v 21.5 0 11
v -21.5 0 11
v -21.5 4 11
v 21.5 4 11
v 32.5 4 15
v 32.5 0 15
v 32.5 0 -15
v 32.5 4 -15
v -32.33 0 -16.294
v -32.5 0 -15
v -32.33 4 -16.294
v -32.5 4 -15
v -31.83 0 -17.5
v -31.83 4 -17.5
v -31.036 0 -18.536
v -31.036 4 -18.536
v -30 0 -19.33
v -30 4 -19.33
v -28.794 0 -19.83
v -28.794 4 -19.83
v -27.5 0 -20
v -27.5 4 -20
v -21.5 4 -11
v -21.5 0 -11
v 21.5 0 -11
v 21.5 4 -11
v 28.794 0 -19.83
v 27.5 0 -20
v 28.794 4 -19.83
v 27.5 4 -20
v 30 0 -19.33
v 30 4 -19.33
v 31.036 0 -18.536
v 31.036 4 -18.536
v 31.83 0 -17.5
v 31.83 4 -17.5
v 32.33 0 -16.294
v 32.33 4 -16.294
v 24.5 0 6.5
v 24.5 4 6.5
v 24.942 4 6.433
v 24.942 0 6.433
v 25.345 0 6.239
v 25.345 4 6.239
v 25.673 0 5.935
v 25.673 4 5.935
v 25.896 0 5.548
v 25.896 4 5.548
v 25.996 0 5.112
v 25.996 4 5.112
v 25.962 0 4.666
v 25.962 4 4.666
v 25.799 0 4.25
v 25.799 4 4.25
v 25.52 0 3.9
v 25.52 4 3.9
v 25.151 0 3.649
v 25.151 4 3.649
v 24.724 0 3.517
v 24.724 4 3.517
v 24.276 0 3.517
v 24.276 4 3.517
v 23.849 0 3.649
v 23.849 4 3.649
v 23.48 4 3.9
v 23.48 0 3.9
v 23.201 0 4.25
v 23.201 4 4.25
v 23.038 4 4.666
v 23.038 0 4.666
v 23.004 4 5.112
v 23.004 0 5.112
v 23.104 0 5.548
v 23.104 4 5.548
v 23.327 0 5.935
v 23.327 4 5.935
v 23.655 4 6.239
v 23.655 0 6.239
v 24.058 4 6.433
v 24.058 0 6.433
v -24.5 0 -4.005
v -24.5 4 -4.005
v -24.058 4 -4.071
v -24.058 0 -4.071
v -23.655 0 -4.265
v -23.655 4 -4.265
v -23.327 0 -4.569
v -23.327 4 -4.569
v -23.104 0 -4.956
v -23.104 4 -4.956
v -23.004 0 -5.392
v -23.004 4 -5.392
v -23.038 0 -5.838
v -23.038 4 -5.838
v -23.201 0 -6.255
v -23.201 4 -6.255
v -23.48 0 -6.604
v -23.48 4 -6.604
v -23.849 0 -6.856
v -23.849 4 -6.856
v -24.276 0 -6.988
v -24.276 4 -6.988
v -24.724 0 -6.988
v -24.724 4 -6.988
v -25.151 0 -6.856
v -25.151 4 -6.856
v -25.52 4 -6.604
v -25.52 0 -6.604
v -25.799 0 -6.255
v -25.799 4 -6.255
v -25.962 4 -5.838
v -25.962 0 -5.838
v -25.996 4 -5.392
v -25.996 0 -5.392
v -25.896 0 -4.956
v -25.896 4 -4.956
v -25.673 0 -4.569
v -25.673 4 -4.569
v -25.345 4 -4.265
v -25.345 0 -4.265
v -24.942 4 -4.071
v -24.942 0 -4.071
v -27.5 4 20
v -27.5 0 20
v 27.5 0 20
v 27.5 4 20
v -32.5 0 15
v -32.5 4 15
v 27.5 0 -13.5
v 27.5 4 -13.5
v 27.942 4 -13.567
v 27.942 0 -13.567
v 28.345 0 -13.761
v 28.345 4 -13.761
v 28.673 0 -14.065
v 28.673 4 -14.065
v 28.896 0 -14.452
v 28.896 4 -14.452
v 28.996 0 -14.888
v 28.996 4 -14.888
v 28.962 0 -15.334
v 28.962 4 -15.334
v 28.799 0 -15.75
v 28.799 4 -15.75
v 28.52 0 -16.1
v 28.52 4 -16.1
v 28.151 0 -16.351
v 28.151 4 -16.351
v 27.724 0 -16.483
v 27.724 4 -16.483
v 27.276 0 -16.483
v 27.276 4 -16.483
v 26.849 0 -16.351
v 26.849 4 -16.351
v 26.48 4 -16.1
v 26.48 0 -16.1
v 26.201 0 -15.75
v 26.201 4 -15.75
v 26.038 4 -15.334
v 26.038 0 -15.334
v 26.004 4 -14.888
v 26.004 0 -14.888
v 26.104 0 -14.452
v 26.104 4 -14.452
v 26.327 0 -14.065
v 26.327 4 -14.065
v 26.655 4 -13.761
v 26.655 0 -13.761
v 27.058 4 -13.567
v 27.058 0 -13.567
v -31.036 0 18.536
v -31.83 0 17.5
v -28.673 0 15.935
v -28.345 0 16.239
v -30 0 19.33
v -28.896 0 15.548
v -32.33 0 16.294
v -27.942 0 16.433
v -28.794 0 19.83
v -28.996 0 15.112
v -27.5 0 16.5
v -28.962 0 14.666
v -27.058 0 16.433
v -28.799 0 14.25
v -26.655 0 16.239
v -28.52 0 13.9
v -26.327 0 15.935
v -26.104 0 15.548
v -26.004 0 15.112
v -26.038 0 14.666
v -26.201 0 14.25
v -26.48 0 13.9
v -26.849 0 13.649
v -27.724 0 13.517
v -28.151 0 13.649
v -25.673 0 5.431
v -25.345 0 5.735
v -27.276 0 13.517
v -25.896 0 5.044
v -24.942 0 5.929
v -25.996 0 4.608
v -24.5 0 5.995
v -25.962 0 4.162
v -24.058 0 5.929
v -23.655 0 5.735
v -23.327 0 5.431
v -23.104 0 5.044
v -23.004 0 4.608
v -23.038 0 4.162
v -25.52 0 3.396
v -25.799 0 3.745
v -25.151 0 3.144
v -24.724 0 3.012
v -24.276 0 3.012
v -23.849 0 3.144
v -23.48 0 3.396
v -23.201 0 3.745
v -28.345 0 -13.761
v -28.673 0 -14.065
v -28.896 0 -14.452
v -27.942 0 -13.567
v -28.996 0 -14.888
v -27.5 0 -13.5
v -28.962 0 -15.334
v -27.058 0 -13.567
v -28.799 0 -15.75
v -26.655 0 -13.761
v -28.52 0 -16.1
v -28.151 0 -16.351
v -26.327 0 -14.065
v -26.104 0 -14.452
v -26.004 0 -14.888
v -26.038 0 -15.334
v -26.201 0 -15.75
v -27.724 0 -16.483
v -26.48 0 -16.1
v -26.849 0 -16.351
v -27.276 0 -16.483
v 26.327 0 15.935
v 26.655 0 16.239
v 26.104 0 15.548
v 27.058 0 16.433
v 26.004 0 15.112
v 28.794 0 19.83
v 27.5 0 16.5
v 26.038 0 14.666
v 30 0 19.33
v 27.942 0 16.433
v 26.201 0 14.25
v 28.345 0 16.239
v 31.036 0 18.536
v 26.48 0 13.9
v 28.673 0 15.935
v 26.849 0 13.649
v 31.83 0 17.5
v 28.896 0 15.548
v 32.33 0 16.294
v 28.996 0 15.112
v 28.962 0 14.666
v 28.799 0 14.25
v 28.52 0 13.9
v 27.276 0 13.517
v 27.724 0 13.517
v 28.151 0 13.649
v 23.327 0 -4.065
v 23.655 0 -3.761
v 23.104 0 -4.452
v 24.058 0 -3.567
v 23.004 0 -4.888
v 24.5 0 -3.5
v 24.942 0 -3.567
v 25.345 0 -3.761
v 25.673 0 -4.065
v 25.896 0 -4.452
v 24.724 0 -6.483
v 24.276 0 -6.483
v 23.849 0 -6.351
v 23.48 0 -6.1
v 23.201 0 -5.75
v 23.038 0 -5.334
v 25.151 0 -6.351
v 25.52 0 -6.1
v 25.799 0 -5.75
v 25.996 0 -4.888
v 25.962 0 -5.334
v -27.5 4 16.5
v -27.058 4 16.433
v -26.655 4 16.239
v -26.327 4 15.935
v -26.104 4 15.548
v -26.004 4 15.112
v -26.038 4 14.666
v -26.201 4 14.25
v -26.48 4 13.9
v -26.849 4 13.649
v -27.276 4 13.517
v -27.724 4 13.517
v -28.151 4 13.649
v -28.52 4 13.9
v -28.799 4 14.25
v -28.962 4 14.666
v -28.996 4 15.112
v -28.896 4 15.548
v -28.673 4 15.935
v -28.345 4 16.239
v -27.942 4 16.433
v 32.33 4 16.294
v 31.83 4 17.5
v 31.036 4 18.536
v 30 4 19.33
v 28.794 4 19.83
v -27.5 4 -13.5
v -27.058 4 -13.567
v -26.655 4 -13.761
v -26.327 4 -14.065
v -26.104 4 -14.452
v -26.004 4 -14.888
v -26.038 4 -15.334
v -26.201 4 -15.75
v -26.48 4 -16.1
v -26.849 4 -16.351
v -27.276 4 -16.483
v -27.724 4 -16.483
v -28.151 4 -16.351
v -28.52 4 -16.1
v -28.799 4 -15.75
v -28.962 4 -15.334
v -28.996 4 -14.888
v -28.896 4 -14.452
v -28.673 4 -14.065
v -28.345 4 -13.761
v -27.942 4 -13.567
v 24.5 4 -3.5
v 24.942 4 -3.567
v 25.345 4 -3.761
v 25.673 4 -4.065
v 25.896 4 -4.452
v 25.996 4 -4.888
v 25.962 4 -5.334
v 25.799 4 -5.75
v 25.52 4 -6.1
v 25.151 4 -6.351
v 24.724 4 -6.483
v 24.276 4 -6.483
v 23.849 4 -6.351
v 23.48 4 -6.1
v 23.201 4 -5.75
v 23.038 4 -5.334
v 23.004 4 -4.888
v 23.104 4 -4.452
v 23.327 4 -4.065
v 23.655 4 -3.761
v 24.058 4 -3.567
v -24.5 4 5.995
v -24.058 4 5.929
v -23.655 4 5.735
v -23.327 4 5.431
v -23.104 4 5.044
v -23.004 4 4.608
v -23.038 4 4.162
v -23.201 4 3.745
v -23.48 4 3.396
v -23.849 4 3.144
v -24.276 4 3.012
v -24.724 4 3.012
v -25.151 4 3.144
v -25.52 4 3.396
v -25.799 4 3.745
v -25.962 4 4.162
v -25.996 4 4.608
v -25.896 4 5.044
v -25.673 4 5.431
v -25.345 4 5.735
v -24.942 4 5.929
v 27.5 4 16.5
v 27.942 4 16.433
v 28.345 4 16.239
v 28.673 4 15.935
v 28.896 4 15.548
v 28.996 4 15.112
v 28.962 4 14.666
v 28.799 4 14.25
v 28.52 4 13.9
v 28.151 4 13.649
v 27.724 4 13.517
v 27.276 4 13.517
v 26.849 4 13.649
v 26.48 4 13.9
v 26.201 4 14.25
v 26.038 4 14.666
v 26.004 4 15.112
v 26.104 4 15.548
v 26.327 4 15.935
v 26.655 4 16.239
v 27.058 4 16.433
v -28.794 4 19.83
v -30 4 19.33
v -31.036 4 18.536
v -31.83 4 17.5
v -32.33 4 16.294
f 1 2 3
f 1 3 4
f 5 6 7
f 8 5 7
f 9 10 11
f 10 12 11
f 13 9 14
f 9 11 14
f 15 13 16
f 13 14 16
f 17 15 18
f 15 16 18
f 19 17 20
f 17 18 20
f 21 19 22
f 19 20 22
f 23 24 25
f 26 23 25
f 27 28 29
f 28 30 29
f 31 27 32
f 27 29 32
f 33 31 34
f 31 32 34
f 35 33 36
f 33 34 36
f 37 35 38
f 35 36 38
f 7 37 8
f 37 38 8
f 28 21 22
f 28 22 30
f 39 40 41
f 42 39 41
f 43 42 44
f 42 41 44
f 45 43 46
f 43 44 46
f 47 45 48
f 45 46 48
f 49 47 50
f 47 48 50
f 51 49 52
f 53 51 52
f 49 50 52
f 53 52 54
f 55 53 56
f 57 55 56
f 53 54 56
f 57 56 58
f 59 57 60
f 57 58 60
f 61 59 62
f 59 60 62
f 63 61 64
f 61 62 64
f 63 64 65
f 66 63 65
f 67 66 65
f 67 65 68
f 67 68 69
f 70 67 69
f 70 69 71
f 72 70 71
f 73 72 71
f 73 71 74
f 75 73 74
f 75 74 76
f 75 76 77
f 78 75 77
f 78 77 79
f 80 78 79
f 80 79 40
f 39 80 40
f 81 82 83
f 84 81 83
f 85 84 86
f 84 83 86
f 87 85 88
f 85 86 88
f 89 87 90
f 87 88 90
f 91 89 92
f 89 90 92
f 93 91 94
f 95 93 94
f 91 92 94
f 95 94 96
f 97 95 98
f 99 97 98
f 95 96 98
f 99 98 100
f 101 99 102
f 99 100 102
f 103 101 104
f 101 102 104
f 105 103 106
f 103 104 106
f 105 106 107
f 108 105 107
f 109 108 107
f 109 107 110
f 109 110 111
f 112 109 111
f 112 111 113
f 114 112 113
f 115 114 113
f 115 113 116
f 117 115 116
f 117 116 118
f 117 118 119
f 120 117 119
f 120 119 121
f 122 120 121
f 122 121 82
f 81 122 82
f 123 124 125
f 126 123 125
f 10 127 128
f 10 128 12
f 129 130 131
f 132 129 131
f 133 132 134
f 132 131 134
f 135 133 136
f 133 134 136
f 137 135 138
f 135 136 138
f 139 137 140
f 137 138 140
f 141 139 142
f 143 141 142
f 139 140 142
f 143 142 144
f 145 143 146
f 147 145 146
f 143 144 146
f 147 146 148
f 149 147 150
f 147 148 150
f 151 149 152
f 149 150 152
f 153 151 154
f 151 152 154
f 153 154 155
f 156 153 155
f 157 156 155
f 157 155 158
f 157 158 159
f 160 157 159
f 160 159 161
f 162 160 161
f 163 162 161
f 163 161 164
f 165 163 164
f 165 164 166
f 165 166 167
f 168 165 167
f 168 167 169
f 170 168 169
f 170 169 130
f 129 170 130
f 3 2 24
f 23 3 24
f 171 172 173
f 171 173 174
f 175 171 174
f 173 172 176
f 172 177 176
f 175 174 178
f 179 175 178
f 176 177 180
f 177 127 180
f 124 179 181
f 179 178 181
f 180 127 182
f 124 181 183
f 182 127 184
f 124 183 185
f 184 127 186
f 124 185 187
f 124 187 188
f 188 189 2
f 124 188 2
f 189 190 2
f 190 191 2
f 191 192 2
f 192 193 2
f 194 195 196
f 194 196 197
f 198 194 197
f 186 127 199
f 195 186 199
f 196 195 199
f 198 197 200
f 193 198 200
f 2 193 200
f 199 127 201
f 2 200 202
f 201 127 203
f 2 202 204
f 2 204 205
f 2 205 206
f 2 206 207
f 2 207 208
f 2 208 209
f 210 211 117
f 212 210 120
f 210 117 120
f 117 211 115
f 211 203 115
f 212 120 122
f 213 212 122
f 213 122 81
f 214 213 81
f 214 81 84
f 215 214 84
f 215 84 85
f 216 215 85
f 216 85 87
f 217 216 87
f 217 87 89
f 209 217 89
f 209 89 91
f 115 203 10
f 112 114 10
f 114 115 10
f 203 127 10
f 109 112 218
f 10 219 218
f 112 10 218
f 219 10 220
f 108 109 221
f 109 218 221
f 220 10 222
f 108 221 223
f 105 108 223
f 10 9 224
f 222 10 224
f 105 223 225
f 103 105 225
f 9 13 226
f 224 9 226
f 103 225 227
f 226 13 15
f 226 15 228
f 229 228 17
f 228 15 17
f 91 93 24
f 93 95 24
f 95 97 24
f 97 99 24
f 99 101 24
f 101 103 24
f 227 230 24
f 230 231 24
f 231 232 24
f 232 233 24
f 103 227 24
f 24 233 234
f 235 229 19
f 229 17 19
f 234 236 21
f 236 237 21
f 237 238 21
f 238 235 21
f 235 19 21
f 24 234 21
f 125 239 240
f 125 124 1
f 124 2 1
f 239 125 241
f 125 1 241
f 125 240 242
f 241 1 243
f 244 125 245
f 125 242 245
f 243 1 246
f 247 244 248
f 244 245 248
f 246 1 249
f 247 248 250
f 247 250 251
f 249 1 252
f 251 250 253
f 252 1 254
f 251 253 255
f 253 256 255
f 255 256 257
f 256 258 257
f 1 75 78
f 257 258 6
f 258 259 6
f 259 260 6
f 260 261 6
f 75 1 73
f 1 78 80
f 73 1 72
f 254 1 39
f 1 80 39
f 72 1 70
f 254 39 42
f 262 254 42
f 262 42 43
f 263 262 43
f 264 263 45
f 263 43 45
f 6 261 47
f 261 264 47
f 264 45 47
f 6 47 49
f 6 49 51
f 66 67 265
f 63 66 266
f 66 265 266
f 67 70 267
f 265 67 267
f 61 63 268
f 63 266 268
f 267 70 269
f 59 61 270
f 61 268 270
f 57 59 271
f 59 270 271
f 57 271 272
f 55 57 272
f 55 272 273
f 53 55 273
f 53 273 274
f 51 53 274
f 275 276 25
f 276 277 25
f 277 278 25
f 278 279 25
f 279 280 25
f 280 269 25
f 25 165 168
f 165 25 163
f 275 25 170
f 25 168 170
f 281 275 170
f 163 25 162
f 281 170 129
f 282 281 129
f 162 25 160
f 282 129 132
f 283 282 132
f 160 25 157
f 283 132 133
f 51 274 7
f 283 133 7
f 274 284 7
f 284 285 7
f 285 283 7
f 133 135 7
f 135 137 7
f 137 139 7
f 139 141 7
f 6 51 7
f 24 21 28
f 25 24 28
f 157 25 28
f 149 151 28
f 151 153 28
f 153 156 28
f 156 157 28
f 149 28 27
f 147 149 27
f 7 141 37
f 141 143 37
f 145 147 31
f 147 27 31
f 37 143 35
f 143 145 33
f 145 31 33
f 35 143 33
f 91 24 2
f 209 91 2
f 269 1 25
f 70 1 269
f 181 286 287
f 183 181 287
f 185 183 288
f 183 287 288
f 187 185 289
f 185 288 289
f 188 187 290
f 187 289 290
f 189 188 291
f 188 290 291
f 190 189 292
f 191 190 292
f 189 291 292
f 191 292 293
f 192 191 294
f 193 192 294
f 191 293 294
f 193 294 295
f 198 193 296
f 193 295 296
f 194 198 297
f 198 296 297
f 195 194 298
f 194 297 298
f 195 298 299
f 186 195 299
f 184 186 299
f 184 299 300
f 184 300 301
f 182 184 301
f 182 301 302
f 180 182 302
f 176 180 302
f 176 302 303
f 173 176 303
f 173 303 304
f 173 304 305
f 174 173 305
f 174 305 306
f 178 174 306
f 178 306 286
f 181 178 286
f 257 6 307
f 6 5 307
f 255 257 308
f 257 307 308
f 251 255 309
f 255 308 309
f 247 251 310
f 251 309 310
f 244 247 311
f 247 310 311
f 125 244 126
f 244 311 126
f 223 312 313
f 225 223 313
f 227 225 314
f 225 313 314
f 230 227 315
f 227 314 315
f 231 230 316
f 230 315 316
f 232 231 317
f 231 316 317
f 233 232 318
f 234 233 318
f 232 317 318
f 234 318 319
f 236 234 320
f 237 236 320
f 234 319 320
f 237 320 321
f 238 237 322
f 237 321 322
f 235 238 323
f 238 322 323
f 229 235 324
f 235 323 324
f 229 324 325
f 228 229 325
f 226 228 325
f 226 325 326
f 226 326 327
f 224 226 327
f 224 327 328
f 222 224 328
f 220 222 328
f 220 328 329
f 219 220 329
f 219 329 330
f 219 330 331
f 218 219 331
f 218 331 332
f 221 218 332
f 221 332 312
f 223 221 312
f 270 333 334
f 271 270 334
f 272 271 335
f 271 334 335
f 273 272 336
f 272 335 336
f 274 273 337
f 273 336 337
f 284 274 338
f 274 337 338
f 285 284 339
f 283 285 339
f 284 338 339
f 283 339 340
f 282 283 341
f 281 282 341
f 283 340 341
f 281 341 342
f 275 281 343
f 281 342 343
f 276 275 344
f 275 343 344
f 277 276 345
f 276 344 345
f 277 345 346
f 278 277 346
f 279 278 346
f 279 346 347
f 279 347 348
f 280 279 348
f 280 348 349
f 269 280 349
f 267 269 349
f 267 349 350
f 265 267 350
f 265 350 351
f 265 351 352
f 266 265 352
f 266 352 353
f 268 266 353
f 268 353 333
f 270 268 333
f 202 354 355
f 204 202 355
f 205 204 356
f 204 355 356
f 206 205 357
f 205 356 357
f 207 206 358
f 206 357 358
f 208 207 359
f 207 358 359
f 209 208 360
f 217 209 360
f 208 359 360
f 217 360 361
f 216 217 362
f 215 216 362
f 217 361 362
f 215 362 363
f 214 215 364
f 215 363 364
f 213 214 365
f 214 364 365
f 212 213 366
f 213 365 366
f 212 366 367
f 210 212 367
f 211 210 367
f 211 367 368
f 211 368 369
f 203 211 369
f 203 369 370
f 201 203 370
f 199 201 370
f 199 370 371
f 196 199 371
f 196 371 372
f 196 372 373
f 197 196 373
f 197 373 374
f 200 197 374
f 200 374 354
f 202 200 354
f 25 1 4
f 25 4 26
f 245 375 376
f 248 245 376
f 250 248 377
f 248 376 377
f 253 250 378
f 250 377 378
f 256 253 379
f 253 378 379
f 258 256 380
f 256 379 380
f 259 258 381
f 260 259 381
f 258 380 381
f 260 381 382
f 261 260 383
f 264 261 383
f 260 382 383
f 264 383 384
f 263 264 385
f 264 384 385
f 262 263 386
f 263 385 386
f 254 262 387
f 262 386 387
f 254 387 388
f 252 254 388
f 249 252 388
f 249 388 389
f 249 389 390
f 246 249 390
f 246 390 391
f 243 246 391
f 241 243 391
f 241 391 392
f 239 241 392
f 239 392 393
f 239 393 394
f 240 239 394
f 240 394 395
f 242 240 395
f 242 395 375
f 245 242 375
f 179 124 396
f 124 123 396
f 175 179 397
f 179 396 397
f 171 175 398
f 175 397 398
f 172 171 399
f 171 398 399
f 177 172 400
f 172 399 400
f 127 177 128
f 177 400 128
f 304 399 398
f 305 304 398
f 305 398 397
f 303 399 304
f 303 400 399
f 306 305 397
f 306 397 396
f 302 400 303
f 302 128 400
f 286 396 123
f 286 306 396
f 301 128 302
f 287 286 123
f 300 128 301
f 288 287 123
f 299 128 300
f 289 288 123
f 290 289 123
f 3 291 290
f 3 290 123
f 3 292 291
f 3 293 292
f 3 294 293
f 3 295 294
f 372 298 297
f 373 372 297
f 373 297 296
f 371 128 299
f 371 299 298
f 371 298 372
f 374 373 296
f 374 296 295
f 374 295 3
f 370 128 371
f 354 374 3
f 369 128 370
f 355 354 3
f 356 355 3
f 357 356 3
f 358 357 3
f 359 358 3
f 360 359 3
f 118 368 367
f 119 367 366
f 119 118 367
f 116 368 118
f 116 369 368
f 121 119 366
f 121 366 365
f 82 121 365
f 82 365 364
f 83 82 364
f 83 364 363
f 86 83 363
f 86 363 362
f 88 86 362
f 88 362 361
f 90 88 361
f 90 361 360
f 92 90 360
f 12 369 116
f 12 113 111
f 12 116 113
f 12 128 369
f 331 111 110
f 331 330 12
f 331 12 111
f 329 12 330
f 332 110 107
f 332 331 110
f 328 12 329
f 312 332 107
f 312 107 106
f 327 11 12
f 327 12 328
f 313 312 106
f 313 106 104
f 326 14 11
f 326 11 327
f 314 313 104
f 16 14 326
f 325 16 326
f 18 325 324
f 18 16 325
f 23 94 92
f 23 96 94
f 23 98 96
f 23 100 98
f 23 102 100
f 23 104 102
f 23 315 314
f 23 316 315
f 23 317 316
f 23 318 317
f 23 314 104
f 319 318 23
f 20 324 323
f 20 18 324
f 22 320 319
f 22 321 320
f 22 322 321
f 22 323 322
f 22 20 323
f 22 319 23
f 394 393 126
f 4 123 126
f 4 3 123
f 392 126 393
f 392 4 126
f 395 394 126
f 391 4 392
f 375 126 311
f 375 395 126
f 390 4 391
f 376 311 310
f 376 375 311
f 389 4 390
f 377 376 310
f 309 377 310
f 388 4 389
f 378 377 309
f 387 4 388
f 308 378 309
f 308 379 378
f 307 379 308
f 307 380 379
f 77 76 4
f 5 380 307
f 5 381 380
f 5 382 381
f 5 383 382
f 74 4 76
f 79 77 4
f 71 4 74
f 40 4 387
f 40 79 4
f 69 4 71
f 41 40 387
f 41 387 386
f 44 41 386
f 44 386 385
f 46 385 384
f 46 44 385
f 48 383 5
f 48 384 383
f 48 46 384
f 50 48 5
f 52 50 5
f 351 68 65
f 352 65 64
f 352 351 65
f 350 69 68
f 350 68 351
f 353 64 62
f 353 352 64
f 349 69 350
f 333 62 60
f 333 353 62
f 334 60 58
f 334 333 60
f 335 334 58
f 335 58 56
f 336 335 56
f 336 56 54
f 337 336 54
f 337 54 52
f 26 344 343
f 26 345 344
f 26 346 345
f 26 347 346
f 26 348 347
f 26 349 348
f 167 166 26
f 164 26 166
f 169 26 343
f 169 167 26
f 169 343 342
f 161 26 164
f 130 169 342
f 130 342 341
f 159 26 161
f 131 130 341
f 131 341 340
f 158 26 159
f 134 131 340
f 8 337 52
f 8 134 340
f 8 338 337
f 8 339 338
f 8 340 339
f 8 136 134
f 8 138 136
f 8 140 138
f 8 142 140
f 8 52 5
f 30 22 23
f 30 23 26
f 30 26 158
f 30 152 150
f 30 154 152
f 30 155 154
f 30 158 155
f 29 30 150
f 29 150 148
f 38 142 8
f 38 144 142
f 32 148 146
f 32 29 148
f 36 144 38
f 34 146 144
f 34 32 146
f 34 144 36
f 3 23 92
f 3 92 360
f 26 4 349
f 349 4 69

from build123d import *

# Parameters (mm, degrees)
SKETCH1_W           = 65
SKETCH1_H           = 40
SKETCH1_W_2         = 43
SKETCH1_H_2         = 22
BOSS_EXTRUDE1_DEPTH = 4
SKETCH2_R           = 1.5
CUT_EXTRUDE1_DEPTH  = 39.369910086
FILLET1_R           = 5
FILLET2_R           = 5
FILLET3_R           = 5
FILLET4_R           = 5


with BuildPart() as part:
    # Sketch1 → Boss-Extrude1 (new body)
    with BuildSketch(Plane(origin=(0, 0, 0), x_dir=(1, 0, 0), z_dir=(0, 1, 0))):
        Rectangle(SKETCH1_W, SKETCH1_H)
        Rectangle(SKETCH1_W_2, SKETCH1_H_2, mode=Mode.SUBTRACT)
    extrude(amount=BOSS_EXTRUDE1_DEPTH)

    # Sketch2 → Cut-Extrude1 (cut, through all)
    with BuildSketch(Plane(origin=(0, 4, 0), x_dir=(1, 0, 0), z_dir=(0, 1, 0))):
        with Locations(Location((-24.5, 5.504503052, 0), (0, 0, 270))):
            Circle(SKETCH2_R)
        with Locations(Location((-24.5, -4.495496948, 0), (0, 0, 270))):
            Circle(SKETCH2_R)
        with Locations(Location((24.5, 5, 0), (0, 0, 270))):
            Circle(SKETCH2_R)
        with Locations(Location((24.5, -5, 0), (0, 0, 270))):
            Circle(SKETCH2_R)
        with Locations(Location((-27.5, 15, 0), (0, 0, 270))):
            Circle(SKETCH2_R)
        with Locations(Location((27.5, 15, 0), (0, 0, 270))):
            Circle(SKETCH2_R)
        with Locations(Location((27.5, -15, 0), (0, 0, 270))):
            Circle(SKETCH2_R)
        with Locations(Location((-27.5, -15, 0), (0, 0, 270))):
            Circle(SKETCH2_R)
    extrude(amount=-CUT_EXTRUDE1_DEPTH, mode=Mode.SUBTRACT)

    # Fillet1
    fillet1_edges = [part.edges().sort_by_distance(p)[0] for p in [
        (-32.5, 2, -20),
    ]]
    fillet(fillet1_edges, radius=FILLET1_R)

    # Fillet2
    fillet2_edges = [part.edges().sort_by_distance(p)[0] for p in [
        (32.5, 2, -20),
    ]]
    fillet(fillet2_edges, radius=FILLET2_R)

    # Fillet3
    fillet3_edges = [part.edges().sort_by_distance(p)[0] for p in [
        (32.5, 2, 20),
    ]]
    fillet(fillet3_edges, radius=FILLET3_R)

    # Fillet4
    fillet4_edges = [part.edges().sort_by_distance(p)[0] for p in [
        (-32.5, 2, 20),
    ]]
    fillet(fillet4_edges, radius=FILLET4_R)


solid = part.part
